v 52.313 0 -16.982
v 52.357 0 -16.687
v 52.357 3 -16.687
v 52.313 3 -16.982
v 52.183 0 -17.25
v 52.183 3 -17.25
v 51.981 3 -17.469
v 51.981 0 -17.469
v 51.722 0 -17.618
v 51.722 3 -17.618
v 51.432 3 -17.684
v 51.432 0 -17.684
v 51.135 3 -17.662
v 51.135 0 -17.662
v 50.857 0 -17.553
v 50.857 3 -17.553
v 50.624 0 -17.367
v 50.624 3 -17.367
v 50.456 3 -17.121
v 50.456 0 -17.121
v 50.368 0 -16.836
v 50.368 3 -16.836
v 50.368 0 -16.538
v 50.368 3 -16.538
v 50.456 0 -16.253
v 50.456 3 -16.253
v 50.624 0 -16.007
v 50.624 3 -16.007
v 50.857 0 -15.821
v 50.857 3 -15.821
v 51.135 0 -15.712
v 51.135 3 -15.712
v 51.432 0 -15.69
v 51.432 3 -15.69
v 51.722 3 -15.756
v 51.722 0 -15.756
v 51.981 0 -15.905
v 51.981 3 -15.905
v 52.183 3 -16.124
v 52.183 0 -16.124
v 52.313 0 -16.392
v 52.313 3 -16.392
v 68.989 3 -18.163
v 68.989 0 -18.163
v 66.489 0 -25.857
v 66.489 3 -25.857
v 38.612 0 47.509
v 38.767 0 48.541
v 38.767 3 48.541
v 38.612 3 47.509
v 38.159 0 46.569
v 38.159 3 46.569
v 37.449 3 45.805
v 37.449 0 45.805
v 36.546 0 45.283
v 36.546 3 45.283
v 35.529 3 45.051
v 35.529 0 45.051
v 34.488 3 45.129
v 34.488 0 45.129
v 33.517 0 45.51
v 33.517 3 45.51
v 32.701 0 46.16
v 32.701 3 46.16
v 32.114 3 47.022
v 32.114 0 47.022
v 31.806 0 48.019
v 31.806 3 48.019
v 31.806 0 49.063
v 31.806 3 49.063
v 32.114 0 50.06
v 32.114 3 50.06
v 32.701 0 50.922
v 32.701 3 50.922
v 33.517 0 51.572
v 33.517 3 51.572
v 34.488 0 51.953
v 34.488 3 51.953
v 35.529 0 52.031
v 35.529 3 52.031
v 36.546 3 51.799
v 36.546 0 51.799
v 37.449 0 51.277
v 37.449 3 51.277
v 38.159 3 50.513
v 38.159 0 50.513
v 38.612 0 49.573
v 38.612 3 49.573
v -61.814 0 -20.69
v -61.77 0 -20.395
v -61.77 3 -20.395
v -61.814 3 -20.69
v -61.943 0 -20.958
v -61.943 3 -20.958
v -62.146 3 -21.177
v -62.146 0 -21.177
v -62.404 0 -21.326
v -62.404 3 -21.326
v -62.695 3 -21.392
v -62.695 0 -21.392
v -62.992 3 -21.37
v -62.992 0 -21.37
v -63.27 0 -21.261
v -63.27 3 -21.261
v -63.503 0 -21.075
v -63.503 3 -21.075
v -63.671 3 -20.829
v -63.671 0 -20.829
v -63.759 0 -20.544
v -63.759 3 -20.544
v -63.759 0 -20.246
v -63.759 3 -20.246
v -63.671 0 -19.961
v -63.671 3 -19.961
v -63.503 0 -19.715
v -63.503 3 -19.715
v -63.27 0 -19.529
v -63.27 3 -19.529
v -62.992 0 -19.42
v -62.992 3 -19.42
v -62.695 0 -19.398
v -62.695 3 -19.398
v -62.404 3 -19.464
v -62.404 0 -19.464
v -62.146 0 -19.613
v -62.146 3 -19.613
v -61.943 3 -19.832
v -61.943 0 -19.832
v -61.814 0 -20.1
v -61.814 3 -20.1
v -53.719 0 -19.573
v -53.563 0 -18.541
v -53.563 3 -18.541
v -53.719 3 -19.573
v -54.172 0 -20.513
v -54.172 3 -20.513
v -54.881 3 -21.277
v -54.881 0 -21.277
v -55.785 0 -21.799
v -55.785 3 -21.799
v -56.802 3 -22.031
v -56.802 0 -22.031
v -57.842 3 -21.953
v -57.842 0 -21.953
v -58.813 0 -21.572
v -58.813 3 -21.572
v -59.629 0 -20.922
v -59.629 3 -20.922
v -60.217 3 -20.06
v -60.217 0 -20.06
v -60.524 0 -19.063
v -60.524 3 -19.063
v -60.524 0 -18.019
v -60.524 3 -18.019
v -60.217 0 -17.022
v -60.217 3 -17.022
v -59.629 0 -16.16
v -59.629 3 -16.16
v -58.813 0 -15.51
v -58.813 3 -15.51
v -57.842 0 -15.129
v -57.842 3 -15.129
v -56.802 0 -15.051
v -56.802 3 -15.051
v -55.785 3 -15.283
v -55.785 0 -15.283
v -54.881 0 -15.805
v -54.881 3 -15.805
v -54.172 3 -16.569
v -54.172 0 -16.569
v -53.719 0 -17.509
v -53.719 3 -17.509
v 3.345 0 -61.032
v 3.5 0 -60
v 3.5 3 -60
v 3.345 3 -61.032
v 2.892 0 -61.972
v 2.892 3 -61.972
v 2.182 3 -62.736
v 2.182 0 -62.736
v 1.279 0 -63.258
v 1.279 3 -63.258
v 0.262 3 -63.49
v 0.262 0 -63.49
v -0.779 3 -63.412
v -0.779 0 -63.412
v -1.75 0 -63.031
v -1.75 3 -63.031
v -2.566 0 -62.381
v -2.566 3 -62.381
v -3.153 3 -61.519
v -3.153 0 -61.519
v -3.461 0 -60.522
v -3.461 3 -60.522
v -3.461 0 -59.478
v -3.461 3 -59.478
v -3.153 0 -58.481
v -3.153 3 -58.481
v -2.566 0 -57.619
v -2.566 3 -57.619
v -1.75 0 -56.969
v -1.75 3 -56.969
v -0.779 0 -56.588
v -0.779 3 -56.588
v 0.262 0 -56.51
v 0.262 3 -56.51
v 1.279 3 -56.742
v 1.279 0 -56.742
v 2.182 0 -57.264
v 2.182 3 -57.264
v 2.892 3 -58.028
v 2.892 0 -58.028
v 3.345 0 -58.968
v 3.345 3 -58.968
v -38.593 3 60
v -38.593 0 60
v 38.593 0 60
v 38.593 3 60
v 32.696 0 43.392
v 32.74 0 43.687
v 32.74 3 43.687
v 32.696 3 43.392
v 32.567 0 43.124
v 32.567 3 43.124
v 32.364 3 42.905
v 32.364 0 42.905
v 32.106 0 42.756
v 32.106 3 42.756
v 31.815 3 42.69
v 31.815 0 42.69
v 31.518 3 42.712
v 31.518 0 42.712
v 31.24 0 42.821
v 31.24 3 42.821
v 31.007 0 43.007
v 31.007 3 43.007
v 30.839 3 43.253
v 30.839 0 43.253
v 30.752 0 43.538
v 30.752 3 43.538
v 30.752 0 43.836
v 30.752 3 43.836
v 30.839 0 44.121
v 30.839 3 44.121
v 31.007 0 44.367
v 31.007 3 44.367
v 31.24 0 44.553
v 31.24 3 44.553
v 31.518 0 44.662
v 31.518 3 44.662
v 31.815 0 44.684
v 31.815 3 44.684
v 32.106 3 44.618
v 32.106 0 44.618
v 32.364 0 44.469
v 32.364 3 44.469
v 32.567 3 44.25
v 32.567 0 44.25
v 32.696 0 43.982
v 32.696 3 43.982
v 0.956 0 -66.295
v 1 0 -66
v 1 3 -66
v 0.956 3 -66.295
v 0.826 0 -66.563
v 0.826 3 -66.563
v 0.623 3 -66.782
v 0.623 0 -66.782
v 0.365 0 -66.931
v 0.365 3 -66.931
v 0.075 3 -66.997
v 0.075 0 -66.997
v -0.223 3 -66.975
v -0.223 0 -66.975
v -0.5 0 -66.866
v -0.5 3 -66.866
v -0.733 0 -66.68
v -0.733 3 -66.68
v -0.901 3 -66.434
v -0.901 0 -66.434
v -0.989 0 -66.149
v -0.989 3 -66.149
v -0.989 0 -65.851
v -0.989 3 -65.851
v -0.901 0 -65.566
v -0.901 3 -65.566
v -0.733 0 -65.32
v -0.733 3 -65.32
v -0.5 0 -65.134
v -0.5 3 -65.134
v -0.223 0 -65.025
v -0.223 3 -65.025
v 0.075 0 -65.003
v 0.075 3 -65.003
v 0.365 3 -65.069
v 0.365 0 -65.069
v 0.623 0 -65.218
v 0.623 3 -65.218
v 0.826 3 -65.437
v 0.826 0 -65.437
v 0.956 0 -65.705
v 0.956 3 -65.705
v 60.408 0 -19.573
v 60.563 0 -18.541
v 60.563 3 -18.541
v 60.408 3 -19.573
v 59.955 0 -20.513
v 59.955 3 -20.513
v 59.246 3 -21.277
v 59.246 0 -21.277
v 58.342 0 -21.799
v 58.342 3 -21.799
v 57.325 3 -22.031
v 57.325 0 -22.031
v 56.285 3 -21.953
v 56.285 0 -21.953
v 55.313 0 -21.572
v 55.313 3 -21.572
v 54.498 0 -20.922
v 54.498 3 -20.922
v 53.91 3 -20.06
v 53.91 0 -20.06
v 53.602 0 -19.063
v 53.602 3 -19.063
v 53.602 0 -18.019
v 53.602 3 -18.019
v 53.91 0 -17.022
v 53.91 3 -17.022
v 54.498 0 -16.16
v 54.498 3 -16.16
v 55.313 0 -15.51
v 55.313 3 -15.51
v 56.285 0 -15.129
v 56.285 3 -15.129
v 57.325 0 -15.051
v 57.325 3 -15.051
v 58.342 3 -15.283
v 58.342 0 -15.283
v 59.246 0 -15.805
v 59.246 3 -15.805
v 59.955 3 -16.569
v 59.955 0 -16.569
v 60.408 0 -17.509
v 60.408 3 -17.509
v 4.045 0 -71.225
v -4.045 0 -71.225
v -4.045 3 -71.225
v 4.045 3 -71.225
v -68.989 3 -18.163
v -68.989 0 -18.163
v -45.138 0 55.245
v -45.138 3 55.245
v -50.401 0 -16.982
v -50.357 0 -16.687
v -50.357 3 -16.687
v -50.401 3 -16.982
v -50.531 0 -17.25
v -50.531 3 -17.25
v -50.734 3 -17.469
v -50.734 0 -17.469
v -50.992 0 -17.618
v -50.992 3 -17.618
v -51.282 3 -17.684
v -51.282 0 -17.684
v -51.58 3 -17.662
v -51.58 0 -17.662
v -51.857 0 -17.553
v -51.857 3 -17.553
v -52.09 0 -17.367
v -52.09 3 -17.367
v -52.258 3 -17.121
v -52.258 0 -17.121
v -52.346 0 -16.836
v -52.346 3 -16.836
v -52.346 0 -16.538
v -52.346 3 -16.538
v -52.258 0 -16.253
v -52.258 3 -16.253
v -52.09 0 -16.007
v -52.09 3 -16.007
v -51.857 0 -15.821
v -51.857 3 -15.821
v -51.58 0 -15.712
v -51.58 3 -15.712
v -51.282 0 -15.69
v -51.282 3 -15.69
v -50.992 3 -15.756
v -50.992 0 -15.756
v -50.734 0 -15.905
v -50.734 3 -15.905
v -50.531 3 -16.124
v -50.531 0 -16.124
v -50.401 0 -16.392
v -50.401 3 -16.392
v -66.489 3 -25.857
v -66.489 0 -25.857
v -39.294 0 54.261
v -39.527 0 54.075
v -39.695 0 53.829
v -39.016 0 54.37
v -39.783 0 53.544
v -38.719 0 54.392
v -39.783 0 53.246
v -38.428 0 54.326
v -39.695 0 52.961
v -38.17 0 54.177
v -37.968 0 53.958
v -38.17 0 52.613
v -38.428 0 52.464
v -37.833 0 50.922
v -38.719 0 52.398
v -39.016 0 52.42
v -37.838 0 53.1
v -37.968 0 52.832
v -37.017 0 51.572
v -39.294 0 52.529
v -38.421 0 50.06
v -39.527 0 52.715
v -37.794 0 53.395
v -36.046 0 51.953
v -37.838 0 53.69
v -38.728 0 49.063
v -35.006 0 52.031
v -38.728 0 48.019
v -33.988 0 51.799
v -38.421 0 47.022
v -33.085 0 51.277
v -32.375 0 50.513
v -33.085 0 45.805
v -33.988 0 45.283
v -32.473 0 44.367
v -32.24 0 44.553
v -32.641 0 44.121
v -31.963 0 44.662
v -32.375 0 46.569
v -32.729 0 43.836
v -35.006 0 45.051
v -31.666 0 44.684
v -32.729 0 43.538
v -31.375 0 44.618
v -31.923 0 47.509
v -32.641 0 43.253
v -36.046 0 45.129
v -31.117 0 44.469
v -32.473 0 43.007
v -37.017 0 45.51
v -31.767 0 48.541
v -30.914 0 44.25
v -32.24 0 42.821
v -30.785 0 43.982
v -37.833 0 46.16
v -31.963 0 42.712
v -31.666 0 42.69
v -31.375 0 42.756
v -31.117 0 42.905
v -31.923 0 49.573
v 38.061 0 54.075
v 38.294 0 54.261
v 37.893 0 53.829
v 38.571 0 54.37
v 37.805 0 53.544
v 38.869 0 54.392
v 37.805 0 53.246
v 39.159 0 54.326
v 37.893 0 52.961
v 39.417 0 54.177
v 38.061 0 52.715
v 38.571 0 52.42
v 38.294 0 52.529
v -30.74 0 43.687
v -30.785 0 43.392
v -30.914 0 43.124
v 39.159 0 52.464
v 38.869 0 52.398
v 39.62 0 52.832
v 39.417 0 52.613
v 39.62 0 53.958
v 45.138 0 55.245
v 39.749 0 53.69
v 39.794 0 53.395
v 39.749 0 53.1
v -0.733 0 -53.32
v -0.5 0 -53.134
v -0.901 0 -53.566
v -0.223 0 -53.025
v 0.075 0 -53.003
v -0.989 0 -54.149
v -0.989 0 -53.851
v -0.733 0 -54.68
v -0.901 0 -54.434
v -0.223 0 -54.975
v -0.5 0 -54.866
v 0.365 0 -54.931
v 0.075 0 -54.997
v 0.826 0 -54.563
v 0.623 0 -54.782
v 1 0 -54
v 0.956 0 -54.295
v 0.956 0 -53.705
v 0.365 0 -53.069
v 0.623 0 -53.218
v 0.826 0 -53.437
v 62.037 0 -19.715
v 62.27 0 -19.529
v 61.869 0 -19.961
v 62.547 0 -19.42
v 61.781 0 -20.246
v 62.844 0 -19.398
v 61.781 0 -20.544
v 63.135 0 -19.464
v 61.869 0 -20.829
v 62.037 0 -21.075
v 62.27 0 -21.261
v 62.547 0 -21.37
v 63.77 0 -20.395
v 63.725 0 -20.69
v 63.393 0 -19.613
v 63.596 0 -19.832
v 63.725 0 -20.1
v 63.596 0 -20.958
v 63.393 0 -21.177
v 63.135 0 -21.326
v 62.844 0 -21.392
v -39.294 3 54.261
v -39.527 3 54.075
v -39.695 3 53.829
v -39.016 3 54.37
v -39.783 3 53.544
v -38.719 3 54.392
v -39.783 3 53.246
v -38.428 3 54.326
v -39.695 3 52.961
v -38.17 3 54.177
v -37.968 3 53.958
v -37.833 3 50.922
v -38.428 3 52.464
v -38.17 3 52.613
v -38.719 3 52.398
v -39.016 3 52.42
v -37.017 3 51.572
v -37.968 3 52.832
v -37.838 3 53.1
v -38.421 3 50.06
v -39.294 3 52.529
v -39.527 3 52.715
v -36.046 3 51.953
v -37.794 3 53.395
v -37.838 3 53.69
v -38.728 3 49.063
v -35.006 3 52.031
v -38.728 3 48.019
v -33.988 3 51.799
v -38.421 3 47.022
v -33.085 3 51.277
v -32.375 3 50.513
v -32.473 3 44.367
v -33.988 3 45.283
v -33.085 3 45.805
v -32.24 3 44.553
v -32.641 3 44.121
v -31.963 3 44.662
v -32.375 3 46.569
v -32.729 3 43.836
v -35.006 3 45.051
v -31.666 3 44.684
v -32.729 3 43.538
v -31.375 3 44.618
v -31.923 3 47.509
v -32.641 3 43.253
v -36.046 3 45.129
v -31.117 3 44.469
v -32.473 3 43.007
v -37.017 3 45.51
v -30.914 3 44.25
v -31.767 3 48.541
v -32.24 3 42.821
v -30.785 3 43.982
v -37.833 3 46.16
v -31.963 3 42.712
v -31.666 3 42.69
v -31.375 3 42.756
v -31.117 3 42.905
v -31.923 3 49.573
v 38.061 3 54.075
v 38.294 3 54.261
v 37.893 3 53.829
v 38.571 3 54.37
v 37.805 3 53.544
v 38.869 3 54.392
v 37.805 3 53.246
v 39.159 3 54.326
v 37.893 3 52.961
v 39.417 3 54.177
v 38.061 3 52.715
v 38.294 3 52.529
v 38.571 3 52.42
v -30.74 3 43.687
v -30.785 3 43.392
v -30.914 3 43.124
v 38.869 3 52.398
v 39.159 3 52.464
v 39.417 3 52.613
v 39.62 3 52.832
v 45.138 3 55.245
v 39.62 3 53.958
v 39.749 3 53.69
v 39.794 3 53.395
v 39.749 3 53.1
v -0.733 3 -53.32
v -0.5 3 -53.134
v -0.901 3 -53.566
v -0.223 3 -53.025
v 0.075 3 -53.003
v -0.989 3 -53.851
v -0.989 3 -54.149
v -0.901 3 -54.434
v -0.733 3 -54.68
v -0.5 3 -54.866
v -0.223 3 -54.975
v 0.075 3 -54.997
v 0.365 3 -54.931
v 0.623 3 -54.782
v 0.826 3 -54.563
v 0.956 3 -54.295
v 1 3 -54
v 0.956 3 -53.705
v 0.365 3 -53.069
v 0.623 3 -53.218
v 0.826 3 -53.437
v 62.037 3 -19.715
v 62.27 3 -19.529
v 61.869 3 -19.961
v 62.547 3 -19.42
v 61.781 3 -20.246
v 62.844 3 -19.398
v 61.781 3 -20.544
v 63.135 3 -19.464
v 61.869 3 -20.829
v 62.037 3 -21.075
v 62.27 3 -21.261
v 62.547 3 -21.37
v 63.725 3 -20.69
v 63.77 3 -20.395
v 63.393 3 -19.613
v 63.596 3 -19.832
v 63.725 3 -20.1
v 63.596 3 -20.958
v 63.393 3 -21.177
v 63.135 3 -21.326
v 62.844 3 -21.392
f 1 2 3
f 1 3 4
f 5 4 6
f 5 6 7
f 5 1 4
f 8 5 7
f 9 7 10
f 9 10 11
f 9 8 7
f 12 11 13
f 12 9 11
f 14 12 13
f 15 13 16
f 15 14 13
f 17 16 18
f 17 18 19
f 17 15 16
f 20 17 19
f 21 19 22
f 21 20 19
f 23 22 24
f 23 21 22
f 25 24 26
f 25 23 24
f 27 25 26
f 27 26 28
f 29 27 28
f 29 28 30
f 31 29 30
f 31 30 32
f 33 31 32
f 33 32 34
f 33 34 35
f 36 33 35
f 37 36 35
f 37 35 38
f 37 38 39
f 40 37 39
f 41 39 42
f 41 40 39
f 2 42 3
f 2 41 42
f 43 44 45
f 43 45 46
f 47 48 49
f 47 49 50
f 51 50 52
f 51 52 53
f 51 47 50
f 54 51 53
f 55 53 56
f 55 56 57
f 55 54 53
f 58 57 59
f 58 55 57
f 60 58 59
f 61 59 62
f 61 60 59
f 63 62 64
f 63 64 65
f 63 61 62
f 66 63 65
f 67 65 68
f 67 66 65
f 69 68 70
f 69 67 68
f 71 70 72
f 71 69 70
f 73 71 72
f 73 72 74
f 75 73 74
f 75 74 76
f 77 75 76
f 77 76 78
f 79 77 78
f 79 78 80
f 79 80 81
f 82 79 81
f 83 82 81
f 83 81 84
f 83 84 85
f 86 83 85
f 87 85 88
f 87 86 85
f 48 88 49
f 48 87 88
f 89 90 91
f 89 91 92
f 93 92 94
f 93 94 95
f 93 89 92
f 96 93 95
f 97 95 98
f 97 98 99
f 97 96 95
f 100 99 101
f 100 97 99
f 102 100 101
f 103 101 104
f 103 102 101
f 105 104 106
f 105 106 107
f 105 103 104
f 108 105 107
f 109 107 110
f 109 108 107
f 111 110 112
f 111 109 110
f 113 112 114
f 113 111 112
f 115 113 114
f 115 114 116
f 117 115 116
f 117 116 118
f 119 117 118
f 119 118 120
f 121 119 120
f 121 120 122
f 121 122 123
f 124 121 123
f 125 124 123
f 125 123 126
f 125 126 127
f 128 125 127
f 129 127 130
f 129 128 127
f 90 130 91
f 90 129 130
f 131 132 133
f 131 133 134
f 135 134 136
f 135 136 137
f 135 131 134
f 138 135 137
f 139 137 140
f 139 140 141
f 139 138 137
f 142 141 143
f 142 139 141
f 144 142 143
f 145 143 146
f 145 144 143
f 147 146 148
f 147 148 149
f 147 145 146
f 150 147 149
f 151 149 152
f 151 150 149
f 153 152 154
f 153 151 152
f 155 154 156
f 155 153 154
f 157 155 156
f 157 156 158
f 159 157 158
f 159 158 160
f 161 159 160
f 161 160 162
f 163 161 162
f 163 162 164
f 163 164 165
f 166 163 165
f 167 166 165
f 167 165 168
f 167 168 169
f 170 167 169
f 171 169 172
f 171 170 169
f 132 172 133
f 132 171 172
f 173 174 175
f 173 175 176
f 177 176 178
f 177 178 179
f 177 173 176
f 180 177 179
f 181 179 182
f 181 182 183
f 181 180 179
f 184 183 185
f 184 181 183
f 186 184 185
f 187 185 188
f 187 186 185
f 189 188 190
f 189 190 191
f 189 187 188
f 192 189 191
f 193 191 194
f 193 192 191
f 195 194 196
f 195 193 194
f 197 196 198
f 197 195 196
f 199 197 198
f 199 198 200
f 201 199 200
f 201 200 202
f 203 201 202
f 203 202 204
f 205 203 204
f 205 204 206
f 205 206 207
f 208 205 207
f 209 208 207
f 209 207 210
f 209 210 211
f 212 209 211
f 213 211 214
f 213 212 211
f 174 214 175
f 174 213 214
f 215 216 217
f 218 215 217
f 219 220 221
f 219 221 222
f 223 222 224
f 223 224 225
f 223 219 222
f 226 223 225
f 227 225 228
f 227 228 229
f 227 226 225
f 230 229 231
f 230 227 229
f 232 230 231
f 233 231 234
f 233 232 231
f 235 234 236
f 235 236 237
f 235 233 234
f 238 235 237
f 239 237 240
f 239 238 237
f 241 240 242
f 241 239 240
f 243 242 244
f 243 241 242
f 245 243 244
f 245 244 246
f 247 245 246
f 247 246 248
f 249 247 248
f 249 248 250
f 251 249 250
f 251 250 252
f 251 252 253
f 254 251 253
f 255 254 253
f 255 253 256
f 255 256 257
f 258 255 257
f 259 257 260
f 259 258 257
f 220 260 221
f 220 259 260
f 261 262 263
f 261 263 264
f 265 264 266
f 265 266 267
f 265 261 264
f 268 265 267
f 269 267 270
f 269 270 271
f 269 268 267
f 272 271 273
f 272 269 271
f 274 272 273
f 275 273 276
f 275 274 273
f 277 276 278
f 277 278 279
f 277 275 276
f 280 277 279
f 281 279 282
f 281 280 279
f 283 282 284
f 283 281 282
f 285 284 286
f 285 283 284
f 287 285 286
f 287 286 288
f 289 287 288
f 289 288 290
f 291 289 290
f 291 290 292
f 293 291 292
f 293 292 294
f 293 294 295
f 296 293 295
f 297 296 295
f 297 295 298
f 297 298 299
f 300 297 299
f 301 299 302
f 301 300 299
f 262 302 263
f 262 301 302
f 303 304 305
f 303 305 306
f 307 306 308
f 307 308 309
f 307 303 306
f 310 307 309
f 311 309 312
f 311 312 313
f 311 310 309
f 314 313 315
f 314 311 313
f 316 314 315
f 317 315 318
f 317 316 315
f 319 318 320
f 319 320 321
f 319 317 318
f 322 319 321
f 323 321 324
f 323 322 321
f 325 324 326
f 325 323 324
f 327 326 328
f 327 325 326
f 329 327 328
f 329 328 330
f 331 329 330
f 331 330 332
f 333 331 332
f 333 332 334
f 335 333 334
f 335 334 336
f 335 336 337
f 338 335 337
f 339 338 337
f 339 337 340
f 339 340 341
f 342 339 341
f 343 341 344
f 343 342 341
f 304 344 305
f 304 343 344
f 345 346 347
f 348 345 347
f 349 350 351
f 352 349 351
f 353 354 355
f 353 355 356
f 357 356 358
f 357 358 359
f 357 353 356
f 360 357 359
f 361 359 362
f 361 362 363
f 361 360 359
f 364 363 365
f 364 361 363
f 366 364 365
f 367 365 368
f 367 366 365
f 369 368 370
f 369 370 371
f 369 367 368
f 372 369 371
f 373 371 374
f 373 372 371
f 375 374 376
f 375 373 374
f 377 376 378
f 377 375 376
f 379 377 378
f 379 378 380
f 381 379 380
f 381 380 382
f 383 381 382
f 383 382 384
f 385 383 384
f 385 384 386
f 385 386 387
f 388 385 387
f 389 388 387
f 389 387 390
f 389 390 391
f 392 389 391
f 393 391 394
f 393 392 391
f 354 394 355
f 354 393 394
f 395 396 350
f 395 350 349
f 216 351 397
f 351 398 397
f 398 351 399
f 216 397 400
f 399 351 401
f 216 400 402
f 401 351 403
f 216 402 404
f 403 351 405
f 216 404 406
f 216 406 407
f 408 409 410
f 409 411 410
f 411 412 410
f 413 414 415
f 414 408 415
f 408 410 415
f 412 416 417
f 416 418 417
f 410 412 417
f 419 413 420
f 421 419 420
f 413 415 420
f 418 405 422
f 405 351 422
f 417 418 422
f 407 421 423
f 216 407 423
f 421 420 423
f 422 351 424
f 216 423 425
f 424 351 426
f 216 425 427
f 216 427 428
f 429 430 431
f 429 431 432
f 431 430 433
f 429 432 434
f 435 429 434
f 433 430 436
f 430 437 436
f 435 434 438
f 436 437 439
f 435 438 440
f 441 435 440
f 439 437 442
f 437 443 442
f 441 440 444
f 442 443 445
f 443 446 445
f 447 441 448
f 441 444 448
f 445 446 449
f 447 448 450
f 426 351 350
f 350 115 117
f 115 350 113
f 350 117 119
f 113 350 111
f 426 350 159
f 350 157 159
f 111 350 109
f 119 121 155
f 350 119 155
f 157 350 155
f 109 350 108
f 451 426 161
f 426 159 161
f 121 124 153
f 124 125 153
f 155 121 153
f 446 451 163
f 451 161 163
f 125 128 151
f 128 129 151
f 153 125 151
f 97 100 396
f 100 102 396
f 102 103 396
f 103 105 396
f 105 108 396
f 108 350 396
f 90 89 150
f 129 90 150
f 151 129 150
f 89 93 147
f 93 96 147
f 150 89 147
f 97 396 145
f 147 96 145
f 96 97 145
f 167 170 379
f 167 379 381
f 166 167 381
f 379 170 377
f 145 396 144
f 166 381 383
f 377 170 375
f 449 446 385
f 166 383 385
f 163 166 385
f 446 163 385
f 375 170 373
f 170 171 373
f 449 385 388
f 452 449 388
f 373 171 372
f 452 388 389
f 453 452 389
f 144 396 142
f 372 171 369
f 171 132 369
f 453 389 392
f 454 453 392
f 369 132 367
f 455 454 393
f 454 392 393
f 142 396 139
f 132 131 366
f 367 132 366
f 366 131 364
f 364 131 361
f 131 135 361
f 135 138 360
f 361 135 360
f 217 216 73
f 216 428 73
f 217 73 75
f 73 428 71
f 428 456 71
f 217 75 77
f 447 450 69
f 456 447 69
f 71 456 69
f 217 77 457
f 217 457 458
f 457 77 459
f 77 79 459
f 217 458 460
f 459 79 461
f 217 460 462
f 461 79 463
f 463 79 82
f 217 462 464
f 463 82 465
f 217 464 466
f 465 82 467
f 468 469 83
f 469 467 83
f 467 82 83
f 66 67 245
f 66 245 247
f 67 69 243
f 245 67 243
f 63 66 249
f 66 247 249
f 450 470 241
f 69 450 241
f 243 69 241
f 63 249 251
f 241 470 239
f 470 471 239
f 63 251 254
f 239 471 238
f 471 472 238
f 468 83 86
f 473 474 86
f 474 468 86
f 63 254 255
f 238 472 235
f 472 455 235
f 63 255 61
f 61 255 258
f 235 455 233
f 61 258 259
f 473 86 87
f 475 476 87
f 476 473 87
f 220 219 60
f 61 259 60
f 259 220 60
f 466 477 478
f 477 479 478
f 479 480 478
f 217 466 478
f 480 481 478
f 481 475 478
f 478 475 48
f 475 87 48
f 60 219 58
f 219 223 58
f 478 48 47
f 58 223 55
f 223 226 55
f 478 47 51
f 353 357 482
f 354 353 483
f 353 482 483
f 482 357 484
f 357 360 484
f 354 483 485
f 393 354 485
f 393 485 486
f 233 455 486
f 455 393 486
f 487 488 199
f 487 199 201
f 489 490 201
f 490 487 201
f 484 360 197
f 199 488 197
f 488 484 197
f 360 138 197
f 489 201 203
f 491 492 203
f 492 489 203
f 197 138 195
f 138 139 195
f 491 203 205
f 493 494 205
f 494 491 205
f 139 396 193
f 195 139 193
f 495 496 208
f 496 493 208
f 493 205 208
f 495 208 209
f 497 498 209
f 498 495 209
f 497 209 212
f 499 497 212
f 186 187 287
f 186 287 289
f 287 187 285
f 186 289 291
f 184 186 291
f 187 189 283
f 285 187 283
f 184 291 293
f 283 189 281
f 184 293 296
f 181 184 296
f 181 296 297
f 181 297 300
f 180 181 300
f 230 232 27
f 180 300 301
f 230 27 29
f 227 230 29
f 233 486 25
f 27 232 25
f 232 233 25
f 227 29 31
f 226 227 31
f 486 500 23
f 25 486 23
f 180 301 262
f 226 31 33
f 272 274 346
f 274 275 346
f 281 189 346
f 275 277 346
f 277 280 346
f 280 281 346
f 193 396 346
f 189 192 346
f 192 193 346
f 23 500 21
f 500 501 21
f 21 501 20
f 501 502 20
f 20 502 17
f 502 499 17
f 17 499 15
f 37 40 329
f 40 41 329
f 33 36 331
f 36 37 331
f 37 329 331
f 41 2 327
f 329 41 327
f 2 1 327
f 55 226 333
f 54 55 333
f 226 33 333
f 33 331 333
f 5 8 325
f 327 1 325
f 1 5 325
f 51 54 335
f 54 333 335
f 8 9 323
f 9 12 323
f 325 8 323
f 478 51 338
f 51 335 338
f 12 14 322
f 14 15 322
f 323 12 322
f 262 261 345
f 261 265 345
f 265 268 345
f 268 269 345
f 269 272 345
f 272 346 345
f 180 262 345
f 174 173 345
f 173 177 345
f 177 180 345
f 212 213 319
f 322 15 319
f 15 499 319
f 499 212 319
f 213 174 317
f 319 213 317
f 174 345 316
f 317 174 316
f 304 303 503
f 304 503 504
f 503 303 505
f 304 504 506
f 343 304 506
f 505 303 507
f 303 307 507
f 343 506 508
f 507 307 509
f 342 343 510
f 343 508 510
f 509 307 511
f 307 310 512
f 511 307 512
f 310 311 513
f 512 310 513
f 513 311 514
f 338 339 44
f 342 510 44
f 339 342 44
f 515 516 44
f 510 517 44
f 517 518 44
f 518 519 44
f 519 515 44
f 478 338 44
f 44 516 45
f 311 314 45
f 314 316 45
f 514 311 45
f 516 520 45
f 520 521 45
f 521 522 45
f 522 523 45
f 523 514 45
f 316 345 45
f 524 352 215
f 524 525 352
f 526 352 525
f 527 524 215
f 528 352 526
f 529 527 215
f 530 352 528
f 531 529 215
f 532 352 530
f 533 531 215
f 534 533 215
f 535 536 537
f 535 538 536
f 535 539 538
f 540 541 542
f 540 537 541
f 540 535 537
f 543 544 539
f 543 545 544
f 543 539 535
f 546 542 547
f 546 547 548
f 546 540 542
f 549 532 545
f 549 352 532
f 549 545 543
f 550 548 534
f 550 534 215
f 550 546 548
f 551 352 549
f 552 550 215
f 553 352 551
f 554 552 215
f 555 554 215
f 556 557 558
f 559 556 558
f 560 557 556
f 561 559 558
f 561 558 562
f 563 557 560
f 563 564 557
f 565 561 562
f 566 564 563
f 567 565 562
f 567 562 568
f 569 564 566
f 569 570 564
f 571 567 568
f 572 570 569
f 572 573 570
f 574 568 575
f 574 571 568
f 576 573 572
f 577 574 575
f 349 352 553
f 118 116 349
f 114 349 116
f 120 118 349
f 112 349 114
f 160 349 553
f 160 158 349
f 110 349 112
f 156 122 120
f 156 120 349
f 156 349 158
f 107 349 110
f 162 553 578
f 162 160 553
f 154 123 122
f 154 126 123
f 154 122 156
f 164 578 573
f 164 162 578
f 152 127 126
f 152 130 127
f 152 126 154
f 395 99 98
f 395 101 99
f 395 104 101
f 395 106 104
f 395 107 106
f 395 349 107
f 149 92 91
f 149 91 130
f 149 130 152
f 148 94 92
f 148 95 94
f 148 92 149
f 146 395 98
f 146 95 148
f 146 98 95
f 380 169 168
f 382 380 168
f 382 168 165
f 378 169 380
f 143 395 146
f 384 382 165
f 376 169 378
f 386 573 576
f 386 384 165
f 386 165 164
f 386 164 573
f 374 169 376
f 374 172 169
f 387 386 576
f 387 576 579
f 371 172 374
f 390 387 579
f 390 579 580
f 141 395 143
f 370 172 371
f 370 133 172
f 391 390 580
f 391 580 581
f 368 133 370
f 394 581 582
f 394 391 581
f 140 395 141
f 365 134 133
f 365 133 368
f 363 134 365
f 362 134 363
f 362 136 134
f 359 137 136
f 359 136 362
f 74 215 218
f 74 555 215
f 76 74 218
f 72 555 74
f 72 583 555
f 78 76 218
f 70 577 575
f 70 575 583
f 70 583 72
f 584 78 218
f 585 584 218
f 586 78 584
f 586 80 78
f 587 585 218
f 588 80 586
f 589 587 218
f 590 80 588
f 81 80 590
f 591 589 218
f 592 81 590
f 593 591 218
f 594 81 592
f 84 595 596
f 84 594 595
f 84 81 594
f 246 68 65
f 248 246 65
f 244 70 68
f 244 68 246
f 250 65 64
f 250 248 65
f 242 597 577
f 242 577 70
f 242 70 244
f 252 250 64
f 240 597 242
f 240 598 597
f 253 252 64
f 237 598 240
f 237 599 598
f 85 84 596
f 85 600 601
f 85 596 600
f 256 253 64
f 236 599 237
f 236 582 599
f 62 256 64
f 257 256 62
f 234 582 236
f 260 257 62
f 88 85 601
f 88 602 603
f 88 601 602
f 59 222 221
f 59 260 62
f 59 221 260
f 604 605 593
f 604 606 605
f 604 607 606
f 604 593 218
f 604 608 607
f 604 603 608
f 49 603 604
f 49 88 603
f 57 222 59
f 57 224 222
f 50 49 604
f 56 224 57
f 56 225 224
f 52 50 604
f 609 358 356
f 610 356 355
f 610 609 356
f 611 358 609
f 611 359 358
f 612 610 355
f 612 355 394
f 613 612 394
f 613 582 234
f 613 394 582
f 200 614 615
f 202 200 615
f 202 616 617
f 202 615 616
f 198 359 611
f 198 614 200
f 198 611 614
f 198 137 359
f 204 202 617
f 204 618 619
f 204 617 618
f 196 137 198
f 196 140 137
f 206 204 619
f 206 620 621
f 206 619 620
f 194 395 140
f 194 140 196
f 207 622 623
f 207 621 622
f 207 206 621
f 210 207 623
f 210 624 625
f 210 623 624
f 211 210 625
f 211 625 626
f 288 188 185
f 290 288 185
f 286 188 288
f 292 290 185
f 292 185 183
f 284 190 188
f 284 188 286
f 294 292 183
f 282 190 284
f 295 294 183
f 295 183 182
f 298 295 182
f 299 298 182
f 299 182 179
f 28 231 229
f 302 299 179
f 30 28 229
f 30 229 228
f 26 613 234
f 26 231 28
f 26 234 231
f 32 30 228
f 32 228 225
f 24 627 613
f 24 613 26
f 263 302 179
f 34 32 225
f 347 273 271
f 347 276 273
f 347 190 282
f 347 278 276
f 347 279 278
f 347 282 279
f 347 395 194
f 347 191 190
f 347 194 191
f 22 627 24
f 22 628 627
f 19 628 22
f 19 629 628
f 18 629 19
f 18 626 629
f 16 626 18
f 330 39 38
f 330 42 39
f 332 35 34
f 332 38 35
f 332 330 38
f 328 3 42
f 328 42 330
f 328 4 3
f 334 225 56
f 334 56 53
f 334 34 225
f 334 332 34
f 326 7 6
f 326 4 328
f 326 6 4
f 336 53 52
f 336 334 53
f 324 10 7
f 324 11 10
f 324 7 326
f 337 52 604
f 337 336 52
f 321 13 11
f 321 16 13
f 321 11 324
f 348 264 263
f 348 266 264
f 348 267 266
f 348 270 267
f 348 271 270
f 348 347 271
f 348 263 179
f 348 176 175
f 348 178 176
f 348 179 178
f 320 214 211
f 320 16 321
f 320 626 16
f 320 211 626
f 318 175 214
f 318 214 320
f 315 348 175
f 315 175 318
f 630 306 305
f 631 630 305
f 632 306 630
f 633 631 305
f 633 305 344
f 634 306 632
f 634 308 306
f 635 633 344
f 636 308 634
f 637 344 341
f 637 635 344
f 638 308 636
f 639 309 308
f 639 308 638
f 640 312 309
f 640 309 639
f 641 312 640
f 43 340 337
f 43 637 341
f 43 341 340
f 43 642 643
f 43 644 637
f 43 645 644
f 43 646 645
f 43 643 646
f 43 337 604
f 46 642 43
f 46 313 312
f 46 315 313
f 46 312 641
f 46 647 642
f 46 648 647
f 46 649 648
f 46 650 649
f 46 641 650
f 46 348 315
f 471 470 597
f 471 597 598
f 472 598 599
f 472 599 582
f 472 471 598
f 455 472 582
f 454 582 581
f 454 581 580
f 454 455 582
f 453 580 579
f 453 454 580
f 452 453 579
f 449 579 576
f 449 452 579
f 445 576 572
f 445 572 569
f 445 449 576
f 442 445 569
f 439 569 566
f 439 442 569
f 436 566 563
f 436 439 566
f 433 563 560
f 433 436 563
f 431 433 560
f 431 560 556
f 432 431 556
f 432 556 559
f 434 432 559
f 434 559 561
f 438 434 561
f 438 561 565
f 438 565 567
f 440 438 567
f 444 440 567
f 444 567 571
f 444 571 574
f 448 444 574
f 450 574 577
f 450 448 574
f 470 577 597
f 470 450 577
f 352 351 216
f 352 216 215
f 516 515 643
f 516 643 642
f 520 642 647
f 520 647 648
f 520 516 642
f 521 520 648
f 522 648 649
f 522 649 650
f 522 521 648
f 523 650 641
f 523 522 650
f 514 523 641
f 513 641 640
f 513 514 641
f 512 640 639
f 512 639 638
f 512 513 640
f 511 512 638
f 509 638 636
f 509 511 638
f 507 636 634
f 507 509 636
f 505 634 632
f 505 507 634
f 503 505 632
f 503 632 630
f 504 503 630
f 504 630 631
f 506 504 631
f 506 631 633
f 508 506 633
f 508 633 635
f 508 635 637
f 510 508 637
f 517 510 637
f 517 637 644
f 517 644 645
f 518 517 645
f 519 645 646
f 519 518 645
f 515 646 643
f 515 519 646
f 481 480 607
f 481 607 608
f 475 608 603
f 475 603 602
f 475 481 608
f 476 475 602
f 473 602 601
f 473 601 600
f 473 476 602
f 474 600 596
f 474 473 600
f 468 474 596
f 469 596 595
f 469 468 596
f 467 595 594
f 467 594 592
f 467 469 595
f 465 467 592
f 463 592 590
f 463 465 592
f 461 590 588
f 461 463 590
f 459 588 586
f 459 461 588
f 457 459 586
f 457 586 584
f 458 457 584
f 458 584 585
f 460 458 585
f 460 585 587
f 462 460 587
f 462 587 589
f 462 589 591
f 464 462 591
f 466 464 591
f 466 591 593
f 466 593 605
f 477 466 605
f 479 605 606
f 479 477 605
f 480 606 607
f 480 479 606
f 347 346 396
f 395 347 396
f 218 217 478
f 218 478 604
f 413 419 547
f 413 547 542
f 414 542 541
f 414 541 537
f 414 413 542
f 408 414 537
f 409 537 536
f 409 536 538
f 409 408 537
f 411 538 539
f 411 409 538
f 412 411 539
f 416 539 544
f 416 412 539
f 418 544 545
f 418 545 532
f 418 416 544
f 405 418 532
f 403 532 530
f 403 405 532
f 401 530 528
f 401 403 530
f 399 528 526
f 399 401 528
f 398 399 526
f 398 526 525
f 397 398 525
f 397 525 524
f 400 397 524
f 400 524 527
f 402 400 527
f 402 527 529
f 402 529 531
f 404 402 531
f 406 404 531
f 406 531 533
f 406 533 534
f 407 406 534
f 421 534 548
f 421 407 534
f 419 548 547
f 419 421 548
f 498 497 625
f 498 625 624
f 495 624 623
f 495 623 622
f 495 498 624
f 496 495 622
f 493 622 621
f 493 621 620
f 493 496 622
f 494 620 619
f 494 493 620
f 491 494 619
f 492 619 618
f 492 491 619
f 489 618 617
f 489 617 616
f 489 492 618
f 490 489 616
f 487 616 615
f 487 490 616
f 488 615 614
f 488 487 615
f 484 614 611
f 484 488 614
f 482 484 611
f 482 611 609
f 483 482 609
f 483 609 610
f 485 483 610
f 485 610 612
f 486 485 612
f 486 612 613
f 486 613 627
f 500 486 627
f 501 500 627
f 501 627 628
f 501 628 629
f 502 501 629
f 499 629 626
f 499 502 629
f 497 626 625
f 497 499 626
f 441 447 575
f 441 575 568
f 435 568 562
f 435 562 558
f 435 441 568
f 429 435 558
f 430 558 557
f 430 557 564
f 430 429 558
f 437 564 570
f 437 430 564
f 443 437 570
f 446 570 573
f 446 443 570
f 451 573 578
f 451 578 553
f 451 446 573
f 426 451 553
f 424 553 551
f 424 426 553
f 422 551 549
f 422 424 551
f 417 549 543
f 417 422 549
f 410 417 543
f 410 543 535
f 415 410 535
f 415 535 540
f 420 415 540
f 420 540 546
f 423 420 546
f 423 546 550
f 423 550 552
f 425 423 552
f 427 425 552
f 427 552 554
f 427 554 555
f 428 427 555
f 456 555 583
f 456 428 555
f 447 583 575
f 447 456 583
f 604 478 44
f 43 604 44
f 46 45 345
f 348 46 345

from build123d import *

# Parameters (mm, degrees)
ESQUISSE2_R        = 3.5
ESQUISSE2_R_2      = 1
BOSS_EXTRU_1_DEPTH = 3
CHANFREIN1_SIZE    = 5


with BuildPart() as part:
    # Esquisse2 → Boss.-Extru.1 (new body)
    with BuildSketch(Plane(origin=(0, 0, 0), x_dir=(1, 0, 0), z_dir=(0, 1, 0))):
        Polygon((70.534230275, 22.917960675), (0, 74.16407865), (-70.534230275, 22.917960675), (-43.59255168, -60), (43.59255168, -60), align=None)
        with Locations((-57.063390978, 18.541019662)):
            Circle(ESQUISSE2_R, mode=Mode.SUBTRACT)
        with Locations((0, 60)):
            Circle(ESQUISSE2_R, mode=Mode.SUBTRACT)
        with Locations((57.063390978, 18.541019662)):
            Circle(ESQUISSE2_R, mode=Mode.SUBTRACT)
        with Locations((35.267115138, -48.541019662)):
            Circle(ESQUISSE2_R, mode=Mode.SUBTRACT)
        with Locations((-35.267115138, -48.541019662)):
            Circle(ESQUISSE2_R, mode=Mode.SUBTRACT)
        with Locations((-62.769730075, 20.395121629)):
            Circle(ESQUISSE2_R_2, mode=Mode.SUBTRACT)
        with Locations((-51.35705188, 16.686917696)):
            Circle(ESQUISSE2_R_2, mode=Mode.SUBTRACT)
        with Locations((0, 66)):
            Circle(ESQUISSE2_R_2, mode=Mode.SUBTRACT)
        with Locations((0, 54)):
            Circle(ESQUISSE2_R_2, mode=Mode.SUBTRACT)
        with Locations((62.769730075, 20.395121629)):
            Circle(ESQUISSE2_R_2, mode=Mode.SUBTRACT)
        with Locations((51.35705188, 16.686917696)):
            Circle(ESQUISSE2_R_2, mode=Mode.SUBTRACT)
        with Locations((38.793826651, -53.395121629)):
            Circle(ESQUISSE2_R_2, mode=Mode.SUBTRACT)
        with Locations((31.740403624, -43.686917696)):
            Circle(ESQUISSE2_R_2, mode=Mode.SUBTRACT)
        with Locations((-38.793826651, -53.395121629)):
            Circle(ESQUISSE2_R_2, mode=Mode.SUBTRACT)
        with Locations((-31.740403624, -43.686917696)):
            Circle(ESQUISSE2_R_2, mode=Mode.SUBTRACT)
    extrude(amount=BOSS_EXTRU_1_DEPTH)

    # Chanfrein1
    chanfrein1_edges = [part.edges().sort_by_distance(p)[0] for p in [
        (43.59255168, 1.5, 60),
        (-43.59255168, 1.5, 60),
        (-70.534230275, 1.5, -22.917960675),
        (0, 1.5, -74.16407865),
        (70.534230275, 1.5, -22.917960675),
    ]]
    chamfer(chanfrein1_edges, length=CHANFREIN1_SIZE)


solid = part.part
